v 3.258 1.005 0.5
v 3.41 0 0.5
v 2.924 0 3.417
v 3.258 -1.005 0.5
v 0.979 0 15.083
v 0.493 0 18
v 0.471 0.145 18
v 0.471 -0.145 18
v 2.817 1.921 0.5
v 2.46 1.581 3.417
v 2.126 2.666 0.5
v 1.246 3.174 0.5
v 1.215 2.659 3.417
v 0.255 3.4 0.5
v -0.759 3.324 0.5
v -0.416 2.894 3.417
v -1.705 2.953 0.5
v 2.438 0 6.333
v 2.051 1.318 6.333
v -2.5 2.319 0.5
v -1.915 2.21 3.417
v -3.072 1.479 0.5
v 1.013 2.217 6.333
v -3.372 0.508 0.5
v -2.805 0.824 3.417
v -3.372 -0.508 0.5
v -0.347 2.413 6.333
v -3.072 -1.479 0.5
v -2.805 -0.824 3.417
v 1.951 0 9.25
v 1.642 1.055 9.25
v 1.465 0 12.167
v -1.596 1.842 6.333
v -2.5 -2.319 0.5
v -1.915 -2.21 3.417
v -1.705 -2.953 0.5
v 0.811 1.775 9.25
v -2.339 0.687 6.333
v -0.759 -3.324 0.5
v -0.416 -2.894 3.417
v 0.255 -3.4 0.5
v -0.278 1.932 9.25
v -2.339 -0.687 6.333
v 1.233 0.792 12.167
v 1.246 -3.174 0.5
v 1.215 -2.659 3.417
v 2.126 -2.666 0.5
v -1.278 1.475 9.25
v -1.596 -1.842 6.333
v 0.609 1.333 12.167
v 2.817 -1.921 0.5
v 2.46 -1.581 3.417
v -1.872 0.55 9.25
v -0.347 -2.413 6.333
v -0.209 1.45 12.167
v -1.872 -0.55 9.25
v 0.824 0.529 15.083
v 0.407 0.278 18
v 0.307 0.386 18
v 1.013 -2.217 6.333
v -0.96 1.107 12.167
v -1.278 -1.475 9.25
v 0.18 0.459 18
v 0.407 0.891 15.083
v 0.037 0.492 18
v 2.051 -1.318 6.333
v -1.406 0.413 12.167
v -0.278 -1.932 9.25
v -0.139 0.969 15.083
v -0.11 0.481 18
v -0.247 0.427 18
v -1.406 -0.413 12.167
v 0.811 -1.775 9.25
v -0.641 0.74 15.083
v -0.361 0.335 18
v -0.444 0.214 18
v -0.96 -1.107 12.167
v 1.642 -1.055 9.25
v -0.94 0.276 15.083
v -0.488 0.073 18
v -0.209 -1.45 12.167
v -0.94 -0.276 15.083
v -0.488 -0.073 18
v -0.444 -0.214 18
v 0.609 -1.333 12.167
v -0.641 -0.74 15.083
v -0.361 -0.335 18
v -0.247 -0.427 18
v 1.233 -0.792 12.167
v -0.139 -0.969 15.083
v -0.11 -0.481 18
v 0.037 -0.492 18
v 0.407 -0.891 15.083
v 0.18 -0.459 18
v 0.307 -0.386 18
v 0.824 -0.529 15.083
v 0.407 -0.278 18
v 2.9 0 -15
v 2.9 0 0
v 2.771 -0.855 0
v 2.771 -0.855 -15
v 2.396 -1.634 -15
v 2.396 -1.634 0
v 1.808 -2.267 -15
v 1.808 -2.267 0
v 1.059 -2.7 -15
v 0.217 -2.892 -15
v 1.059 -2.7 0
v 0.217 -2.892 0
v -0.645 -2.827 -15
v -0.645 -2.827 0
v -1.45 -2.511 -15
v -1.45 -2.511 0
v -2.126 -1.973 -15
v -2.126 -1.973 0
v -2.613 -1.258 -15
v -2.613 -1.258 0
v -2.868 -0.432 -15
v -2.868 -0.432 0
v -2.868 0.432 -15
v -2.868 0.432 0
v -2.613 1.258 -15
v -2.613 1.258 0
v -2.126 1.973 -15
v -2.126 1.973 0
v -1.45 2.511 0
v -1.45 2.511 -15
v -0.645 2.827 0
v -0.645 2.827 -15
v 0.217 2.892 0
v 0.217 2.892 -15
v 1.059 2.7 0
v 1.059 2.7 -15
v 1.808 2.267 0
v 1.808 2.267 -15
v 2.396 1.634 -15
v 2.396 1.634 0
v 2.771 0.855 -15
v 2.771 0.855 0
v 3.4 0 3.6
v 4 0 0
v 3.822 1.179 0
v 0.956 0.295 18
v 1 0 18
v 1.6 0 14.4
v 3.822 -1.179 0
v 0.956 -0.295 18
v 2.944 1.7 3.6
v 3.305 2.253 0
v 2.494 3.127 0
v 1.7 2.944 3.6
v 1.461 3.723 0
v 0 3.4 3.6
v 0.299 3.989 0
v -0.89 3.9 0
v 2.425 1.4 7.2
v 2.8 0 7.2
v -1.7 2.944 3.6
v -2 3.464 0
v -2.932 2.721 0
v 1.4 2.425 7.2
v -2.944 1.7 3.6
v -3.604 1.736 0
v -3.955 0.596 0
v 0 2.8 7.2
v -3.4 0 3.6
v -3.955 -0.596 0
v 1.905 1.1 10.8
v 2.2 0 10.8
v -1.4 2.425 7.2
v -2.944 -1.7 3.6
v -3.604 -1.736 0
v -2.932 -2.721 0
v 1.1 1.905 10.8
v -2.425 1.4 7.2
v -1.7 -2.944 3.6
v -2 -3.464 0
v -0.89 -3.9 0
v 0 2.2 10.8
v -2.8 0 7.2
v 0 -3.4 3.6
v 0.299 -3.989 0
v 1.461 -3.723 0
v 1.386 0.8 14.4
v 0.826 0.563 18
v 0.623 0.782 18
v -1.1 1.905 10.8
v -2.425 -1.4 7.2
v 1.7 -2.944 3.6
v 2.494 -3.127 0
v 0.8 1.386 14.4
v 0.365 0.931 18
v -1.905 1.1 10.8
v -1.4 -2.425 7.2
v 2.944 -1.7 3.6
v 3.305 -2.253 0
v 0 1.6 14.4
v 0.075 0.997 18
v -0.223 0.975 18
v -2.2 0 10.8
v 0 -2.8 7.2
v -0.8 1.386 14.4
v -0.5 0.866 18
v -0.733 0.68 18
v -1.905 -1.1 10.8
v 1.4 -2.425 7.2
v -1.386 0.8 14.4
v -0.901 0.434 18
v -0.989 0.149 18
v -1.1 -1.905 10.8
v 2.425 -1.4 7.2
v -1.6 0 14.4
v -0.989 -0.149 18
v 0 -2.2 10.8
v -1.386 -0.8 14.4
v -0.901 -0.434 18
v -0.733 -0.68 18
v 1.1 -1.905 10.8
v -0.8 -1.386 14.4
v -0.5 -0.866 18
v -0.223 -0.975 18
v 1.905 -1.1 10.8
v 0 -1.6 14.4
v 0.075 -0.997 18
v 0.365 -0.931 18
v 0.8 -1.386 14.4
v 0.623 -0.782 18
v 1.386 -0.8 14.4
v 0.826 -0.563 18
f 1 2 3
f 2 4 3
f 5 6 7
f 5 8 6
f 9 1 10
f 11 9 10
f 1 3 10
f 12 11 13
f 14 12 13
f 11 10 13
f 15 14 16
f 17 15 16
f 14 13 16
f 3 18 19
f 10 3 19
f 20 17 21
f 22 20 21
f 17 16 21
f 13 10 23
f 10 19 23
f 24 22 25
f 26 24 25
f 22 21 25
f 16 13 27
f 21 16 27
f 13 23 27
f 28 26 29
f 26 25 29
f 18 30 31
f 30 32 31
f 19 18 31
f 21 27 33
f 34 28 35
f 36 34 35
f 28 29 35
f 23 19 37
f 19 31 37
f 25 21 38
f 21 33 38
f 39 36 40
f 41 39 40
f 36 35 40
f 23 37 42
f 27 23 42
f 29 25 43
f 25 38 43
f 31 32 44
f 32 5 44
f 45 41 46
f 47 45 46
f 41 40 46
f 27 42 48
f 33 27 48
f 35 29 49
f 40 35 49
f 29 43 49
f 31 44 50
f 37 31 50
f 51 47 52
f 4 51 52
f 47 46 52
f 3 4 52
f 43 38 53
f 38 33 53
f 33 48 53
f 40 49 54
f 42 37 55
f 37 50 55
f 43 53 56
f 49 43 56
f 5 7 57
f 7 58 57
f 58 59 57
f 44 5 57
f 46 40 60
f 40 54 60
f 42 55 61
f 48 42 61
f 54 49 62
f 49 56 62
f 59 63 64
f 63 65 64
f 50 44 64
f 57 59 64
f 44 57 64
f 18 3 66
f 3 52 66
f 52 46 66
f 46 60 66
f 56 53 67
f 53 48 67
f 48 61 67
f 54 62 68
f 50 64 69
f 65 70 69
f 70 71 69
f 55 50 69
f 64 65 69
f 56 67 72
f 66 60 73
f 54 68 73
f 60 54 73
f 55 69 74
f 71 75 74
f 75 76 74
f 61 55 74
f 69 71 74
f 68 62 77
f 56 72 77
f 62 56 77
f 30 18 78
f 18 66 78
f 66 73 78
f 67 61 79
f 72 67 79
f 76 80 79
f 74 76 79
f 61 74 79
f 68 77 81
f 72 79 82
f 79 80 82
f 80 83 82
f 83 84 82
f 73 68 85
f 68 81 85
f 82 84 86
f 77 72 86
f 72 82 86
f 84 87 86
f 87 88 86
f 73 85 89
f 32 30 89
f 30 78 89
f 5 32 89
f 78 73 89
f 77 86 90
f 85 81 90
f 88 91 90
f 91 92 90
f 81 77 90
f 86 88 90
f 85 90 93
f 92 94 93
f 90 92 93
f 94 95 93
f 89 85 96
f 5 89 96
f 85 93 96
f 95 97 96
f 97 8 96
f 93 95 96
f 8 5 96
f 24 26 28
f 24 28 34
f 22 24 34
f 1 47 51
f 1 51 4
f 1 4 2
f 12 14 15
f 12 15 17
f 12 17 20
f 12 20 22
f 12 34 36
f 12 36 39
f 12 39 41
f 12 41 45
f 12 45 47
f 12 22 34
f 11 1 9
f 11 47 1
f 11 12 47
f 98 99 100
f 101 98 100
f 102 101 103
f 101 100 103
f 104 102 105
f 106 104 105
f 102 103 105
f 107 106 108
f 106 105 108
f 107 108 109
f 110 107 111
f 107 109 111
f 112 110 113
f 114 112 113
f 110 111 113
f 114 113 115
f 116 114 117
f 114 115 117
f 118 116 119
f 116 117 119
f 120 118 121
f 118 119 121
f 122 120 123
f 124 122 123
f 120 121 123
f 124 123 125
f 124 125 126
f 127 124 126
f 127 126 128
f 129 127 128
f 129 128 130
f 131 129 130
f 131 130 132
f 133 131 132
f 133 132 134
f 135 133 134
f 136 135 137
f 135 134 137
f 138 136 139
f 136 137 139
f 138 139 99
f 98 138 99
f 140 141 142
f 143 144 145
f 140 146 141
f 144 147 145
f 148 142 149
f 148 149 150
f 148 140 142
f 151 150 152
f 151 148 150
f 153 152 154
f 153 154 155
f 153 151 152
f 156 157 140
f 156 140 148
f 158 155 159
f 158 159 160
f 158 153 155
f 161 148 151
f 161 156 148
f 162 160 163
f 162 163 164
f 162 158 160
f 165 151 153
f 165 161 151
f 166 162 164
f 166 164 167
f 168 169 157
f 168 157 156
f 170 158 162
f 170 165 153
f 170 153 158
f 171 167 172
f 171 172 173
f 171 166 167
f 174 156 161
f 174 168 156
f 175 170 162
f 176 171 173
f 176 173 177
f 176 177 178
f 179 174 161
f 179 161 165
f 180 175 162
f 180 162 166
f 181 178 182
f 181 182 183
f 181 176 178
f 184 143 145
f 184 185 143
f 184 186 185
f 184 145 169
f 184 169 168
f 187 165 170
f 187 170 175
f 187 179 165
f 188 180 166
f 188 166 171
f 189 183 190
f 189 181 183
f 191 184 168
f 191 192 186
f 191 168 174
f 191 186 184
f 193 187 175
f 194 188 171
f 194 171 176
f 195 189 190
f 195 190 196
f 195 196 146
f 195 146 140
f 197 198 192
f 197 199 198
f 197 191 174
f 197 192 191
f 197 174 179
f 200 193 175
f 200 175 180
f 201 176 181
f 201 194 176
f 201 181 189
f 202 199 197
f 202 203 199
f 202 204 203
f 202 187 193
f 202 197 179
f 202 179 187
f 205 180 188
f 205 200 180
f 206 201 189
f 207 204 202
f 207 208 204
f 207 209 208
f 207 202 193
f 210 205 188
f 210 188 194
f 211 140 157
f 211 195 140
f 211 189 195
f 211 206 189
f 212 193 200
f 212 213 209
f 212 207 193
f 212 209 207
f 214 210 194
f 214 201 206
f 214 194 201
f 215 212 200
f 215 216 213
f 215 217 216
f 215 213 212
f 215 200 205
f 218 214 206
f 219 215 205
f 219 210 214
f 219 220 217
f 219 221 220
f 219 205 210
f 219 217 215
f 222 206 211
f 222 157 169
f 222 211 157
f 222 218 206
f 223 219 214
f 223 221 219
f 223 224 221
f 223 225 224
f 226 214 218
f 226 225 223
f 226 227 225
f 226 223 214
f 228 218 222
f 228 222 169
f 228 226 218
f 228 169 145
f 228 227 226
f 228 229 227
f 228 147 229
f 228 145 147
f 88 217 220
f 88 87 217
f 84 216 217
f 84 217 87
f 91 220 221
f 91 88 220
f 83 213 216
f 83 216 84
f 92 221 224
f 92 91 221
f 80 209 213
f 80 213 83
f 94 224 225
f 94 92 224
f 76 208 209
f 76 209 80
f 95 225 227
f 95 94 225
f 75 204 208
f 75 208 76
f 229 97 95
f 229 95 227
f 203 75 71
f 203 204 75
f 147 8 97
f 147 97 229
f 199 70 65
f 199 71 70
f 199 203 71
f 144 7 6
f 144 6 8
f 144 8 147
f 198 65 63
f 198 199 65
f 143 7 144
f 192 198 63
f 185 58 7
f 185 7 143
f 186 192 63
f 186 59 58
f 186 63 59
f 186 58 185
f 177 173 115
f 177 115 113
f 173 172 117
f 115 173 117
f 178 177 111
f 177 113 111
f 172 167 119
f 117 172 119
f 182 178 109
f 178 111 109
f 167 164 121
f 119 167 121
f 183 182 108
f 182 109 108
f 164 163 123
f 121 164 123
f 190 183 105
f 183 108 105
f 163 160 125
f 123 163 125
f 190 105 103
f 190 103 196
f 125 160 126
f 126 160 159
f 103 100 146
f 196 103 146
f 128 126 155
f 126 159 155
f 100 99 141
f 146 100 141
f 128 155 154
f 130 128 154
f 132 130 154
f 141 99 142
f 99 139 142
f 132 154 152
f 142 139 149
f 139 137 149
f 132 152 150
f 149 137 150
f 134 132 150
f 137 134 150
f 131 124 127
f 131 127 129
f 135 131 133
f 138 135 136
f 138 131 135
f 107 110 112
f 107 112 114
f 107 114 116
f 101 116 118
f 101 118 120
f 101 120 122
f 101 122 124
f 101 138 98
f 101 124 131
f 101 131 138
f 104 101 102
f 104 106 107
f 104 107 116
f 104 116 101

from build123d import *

# Parameters (mm, degrees)
F0_R     = 4
F2_R     = 1
F4_T     = -0.5
F5_R     = 2.9
F6_DEPTH = 15


with BuildPart() as f3:
    # F0 (on Top) → F3 section 0
    with BuildSketch(Plane.XY):
        Circle(F0_R)
    # F2 (on offset) → F3 section 1
    with BuildSketch(Plane.XY.offset(18)):
        Circle(F2_R)
    loft()

    # F4
    f4_openings = [f3.faces().sort_by_distance(p)[0] for p in [
        (0, 0, 18),
    ]]
    offset(amount=F4_T, openings=f4_openings, kind=Kind.INTERSECTION)

    # F5 (on face) → F6 (join)
    with BuildSketch(Plane(origin=(0, 0, 0), x_dir=(1, 0, 0), z_dir=(0, 0, -1))):
        Circle(F5_R)
    extrude(amount=F6_DEPTH)


solid = f3.part
